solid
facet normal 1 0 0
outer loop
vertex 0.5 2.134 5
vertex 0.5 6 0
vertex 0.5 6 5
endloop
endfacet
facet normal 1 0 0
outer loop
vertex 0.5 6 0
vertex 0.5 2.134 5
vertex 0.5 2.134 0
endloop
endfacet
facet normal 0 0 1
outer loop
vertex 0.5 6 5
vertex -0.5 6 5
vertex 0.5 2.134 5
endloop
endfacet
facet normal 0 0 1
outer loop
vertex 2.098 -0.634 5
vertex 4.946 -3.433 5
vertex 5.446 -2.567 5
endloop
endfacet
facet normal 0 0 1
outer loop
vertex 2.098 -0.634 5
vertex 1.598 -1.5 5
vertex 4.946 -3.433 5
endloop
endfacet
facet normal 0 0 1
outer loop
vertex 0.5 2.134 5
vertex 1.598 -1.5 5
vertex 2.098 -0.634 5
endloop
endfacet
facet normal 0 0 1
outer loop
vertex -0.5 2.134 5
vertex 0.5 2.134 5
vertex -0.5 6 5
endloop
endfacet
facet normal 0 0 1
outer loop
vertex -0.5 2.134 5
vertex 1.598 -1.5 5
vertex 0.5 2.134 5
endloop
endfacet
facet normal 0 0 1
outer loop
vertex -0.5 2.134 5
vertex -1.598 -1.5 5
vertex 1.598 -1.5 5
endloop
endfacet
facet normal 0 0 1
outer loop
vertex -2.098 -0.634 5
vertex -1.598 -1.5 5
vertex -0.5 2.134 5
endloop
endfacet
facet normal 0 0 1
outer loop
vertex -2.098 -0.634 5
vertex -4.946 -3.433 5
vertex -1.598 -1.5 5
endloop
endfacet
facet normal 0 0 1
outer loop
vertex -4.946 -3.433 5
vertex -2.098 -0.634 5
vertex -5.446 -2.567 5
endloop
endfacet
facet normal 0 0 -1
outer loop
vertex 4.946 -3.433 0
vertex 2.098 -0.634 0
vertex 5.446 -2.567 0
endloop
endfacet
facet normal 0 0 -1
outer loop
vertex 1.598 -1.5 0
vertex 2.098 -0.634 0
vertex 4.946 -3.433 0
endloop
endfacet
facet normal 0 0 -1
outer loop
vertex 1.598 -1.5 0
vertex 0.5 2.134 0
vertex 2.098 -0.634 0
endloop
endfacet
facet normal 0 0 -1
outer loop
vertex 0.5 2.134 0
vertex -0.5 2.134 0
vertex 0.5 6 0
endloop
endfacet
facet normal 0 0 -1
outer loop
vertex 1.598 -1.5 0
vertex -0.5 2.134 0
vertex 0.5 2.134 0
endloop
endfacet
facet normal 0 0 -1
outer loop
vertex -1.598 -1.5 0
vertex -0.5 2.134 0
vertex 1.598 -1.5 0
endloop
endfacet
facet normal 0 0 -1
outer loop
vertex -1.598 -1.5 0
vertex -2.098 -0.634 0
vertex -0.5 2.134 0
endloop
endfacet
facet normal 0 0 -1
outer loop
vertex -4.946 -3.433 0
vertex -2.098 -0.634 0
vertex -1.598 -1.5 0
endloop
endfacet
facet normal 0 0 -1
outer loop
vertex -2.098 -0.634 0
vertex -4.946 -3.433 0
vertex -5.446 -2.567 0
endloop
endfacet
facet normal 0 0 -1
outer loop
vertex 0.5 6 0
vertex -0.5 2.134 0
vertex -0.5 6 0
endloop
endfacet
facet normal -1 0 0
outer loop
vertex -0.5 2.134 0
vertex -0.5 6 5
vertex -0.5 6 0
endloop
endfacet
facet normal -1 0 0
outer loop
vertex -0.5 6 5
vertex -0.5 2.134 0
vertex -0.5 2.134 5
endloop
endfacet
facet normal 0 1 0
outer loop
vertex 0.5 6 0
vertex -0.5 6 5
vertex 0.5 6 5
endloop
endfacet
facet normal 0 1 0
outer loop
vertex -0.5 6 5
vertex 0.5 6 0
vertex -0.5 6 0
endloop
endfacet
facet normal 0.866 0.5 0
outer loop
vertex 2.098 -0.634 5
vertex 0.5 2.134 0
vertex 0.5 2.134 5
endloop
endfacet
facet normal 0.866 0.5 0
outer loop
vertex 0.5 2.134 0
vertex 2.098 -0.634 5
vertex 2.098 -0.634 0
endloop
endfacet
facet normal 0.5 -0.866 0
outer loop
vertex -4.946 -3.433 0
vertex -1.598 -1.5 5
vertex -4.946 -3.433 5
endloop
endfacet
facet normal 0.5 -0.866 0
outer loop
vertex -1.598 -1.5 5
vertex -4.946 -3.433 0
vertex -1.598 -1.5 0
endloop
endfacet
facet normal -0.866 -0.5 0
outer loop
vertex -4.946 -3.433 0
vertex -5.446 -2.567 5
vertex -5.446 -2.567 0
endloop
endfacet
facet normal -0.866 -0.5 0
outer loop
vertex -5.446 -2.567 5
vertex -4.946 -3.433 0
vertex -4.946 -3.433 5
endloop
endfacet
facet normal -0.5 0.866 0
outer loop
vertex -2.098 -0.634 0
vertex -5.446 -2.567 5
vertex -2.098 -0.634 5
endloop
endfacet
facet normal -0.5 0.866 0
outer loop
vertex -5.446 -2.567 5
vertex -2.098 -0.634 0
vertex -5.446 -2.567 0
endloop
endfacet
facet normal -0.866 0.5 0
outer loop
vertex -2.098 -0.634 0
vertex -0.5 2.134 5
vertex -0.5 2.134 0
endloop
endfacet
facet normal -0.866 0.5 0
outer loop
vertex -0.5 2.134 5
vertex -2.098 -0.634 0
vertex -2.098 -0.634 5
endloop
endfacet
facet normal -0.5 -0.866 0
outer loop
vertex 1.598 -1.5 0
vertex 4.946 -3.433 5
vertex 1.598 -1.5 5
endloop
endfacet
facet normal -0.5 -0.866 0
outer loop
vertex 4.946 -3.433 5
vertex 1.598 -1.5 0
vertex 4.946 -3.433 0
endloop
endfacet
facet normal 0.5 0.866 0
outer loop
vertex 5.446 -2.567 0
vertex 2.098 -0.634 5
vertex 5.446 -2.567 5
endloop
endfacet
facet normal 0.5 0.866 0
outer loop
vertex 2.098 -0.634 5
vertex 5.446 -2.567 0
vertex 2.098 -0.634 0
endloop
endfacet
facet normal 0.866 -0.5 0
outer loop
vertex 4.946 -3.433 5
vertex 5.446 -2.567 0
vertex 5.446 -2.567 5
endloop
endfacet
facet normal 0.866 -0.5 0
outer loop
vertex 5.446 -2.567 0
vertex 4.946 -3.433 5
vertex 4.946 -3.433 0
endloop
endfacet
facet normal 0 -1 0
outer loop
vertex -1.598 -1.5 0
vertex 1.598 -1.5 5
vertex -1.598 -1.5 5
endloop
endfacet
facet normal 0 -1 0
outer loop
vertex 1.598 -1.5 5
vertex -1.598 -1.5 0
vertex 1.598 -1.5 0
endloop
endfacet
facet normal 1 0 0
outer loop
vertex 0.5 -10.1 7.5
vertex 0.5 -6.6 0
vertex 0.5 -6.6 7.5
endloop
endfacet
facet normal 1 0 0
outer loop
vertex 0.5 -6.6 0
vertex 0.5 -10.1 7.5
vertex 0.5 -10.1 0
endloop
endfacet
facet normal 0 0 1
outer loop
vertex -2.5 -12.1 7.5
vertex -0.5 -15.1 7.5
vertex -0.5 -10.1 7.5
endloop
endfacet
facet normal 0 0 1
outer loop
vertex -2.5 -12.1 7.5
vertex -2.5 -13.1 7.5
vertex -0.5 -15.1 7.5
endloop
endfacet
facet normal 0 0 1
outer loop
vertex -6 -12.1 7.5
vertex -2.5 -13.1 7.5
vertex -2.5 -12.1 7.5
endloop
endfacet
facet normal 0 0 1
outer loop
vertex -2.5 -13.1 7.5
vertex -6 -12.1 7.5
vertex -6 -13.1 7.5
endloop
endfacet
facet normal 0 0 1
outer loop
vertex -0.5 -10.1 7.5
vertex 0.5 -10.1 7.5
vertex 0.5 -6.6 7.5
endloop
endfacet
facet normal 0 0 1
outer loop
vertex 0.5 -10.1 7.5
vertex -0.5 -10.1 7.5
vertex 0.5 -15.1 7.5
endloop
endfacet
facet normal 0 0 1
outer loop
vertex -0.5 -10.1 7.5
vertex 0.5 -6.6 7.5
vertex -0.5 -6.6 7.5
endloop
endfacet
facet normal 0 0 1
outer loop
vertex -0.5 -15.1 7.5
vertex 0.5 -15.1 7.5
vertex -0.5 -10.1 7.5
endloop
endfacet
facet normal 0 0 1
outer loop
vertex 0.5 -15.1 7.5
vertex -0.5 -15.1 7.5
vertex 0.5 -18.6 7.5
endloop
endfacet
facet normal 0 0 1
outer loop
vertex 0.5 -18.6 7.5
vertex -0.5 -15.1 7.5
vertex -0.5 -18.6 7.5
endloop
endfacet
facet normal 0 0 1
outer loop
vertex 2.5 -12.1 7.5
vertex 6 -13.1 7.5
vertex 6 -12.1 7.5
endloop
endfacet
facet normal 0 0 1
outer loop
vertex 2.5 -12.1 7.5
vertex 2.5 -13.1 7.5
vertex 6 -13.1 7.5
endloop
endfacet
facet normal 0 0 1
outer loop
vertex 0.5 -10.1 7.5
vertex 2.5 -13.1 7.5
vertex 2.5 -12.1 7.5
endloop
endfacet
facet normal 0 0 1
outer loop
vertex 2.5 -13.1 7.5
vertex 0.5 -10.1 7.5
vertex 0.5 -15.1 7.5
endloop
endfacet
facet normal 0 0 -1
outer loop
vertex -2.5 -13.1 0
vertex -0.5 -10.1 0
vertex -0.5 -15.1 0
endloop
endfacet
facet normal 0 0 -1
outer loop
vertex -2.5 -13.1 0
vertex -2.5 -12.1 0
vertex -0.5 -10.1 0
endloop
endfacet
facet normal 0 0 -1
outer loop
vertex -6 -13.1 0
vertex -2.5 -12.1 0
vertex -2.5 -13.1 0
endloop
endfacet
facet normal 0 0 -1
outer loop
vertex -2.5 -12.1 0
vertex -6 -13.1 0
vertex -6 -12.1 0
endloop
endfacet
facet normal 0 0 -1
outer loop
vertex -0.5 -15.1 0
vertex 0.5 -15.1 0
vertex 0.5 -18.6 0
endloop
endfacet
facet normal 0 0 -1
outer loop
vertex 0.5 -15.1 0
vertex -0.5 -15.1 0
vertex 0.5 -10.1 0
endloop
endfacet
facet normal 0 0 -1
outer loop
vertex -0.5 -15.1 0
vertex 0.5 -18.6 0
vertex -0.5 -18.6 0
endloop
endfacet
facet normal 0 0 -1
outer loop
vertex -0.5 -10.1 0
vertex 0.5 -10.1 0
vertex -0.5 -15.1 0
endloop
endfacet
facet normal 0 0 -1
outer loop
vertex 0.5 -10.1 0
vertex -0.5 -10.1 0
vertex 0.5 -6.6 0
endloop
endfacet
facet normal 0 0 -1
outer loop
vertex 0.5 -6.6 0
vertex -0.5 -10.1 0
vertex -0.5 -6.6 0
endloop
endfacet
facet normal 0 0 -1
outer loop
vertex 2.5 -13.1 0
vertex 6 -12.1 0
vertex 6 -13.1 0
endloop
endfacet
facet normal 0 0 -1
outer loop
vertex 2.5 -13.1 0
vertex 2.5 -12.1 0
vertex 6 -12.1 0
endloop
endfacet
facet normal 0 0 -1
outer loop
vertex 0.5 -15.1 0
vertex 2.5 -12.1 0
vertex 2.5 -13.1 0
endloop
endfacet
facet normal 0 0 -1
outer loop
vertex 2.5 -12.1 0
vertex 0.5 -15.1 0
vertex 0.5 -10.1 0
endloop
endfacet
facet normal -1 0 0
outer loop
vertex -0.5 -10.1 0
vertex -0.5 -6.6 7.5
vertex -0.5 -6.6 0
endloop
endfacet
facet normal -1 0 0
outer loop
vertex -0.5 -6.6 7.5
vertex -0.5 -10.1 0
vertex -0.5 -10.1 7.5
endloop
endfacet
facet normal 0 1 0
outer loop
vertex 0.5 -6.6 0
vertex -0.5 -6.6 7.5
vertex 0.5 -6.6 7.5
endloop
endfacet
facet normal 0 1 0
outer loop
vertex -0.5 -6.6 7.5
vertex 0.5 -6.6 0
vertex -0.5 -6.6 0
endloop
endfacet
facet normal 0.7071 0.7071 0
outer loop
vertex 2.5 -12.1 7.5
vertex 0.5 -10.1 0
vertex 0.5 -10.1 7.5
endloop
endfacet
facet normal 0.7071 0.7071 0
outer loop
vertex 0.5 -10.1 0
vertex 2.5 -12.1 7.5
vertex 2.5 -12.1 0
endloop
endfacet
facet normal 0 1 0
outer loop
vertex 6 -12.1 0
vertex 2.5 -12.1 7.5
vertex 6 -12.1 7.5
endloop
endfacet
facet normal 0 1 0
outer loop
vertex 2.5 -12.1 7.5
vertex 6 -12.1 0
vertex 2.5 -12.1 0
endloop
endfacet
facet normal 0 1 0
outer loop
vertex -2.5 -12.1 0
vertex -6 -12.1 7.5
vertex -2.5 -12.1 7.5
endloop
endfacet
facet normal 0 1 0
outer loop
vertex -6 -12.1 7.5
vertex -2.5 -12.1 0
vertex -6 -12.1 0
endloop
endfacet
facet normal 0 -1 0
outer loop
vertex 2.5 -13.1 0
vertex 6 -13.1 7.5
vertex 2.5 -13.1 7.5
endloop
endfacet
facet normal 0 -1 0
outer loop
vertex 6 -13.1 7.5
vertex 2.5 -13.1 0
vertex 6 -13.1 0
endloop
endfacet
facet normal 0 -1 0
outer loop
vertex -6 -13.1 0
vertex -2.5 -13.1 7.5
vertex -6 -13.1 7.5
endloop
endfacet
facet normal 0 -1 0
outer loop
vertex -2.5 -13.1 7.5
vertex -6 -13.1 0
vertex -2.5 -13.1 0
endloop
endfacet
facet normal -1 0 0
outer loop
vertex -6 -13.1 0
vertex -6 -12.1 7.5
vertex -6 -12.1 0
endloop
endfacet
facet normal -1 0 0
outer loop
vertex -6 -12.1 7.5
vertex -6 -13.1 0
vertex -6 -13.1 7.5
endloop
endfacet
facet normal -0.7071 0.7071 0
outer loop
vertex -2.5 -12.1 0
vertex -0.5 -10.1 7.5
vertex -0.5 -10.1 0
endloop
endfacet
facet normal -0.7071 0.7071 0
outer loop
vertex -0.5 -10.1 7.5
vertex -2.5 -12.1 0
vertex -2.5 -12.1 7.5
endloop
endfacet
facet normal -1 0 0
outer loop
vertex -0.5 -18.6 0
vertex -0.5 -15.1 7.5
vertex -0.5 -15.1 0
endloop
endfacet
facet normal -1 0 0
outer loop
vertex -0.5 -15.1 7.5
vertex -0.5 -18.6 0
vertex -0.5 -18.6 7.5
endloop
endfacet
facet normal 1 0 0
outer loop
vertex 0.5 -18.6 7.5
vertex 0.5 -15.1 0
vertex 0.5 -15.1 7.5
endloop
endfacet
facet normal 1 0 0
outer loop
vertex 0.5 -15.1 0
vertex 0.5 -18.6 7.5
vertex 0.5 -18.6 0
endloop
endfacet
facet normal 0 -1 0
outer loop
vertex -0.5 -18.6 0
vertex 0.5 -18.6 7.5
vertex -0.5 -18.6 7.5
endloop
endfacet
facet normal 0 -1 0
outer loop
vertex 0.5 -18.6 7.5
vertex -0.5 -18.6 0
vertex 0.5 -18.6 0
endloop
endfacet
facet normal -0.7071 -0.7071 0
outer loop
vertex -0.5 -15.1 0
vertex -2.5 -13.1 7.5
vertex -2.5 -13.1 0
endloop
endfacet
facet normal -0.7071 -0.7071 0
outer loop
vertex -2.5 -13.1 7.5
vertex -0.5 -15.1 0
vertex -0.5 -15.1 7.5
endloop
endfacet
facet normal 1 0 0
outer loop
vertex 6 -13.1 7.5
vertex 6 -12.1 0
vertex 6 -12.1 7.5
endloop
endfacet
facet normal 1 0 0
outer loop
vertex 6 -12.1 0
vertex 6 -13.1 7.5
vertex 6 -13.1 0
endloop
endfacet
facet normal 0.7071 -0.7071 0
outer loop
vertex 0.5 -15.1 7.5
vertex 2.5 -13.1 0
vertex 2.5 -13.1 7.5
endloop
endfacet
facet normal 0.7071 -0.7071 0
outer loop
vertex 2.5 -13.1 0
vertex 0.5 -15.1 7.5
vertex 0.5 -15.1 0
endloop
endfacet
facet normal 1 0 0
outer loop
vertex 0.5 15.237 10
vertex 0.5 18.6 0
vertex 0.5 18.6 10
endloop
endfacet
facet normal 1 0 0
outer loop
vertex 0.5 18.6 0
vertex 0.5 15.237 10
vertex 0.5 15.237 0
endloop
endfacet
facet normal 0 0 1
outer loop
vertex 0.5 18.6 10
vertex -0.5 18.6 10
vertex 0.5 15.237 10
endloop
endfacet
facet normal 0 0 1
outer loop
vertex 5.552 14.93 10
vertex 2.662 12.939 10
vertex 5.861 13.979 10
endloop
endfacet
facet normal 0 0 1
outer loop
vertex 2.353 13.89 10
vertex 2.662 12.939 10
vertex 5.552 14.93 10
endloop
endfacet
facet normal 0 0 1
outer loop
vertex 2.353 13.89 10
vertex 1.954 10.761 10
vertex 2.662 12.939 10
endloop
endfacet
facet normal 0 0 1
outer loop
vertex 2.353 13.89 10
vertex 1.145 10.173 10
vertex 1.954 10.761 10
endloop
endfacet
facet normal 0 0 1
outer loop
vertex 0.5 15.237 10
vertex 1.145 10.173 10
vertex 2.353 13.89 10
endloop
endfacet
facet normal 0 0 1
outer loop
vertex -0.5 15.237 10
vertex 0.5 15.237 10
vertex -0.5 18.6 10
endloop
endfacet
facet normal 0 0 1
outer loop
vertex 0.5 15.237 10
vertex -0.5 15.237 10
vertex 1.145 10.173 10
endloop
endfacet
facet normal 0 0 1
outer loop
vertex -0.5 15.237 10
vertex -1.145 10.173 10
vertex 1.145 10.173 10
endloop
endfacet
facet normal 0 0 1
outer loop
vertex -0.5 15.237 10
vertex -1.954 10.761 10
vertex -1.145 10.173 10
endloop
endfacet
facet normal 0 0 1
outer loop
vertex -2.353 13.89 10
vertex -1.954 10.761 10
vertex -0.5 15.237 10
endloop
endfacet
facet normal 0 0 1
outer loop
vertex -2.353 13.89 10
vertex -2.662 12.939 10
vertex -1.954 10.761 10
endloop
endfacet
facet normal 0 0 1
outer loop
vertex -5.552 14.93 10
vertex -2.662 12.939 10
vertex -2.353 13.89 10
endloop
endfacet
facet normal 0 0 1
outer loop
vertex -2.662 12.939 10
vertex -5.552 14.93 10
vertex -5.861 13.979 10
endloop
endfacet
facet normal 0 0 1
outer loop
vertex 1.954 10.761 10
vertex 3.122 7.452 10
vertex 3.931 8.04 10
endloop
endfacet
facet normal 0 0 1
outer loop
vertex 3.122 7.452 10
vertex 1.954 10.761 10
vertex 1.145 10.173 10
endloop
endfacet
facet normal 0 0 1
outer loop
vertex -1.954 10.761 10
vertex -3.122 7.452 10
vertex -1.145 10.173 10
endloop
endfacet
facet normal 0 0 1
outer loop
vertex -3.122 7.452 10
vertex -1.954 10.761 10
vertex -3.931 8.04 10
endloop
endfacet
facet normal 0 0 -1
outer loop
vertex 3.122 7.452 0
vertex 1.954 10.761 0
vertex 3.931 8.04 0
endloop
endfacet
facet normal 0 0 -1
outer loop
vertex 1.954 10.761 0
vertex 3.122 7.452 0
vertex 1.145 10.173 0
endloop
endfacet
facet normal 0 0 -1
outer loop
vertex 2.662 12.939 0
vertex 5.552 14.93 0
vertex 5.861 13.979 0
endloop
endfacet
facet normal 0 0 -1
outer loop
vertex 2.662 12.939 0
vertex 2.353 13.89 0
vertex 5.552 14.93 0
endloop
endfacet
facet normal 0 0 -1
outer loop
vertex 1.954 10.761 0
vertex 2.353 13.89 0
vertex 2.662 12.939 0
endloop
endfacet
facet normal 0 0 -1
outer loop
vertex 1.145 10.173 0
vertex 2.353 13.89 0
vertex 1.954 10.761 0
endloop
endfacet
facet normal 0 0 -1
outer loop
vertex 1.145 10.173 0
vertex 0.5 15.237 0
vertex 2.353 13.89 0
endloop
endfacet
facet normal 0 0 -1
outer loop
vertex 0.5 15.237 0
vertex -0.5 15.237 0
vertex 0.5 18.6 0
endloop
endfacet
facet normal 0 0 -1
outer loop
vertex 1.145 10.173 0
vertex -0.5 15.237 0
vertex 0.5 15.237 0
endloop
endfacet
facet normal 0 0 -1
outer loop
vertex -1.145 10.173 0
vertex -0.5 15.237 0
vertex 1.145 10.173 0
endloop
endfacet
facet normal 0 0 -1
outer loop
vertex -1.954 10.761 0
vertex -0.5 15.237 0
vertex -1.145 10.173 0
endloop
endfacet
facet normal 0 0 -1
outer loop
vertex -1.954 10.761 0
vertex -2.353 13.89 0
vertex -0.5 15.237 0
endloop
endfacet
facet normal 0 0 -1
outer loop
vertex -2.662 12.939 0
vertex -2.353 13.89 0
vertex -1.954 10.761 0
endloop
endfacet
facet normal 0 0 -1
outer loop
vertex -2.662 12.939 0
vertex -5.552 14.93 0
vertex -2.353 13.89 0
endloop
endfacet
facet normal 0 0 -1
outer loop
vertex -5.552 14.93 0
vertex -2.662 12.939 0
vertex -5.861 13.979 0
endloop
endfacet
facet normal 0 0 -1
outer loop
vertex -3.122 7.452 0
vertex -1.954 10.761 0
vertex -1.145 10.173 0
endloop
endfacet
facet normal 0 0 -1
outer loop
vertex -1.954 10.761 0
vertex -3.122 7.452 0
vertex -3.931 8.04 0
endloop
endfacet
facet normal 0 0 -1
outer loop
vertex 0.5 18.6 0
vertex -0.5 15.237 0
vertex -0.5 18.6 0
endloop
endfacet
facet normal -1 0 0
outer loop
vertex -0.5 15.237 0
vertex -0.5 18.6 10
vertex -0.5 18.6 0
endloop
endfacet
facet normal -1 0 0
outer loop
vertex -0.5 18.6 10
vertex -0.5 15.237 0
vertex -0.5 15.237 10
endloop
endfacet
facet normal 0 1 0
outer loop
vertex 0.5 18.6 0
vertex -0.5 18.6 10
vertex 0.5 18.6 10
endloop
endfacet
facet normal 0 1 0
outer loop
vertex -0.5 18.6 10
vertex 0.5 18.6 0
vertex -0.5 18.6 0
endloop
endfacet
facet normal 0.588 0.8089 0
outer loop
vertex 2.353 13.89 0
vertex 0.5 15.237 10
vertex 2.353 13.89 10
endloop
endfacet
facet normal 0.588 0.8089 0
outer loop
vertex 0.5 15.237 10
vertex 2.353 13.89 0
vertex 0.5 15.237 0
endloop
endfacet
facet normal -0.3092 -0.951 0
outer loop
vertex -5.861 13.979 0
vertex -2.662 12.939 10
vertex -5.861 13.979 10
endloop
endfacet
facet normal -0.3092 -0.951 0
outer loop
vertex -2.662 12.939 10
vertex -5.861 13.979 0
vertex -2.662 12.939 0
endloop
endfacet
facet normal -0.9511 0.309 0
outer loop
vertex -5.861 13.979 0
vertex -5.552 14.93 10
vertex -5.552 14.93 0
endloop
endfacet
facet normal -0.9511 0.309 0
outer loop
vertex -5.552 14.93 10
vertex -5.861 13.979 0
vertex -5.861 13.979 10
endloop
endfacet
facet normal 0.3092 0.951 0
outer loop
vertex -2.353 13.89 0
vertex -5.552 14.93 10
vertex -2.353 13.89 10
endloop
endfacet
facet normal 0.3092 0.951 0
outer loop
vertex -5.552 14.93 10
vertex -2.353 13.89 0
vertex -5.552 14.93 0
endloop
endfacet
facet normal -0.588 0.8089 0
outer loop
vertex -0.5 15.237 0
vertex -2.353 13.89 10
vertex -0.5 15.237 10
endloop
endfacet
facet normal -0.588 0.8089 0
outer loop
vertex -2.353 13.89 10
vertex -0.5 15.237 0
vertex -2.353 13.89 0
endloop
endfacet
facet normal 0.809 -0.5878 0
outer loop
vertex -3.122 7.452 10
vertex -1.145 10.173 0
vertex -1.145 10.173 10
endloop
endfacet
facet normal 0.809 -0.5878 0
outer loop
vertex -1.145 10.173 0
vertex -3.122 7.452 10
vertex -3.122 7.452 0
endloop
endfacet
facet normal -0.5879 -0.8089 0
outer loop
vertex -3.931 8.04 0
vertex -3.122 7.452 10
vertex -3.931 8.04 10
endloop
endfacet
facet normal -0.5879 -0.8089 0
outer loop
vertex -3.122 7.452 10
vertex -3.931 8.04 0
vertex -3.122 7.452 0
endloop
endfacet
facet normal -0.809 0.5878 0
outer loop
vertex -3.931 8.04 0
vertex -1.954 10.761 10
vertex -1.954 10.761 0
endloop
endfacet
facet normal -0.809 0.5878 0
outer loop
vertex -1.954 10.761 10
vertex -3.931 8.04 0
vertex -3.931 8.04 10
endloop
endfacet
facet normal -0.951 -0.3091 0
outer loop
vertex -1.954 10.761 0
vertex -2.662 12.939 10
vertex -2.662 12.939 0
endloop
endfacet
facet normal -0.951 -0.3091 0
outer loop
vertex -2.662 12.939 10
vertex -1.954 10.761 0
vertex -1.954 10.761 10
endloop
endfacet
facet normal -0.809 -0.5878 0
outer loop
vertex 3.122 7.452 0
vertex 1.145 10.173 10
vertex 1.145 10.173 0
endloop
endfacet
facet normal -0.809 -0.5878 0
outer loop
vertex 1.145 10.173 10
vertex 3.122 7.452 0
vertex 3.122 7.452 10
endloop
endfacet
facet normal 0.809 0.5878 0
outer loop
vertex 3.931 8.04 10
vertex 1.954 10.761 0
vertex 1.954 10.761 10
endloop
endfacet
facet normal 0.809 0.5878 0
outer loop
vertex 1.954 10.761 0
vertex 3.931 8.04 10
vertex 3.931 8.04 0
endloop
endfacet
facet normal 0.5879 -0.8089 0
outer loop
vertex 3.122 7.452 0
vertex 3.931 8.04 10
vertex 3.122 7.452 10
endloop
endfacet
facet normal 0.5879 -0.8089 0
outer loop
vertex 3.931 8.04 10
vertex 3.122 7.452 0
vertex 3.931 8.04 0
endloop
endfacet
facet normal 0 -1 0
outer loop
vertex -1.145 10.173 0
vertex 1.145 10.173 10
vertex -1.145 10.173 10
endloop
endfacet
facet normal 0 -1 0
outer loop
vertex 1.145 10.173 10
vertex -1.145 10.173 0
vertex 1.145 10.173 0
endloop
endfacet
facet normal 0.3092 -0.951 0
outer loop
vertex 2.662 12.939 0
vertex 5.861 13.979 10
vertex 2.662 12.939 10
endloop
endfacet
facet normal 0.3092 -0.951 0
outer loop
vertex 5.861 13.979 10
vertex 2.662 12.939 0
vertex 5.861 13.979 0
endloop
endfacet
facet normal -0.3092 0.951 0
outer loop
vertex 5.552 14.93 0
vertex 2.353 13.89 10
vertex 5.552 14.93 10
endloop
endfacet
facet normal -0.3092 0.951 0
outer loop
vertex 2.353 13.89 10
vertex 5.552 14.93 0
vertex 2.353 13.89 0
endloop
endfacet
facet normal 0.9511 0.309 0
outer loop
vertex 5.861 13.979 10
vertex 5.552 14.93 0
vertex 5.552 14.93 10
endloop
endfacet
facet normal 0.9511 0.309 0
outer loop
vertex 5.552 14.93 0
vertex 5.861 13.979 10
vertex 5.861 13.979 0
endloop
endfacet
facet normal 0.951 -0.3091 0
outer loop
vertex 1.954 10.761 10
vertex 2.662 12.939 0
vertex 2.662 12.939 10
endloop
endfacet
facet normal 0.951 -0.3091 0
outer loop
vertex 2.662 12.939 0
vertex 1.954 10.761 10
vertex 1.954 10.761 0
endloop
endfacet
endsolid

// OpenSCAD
w=1;
d=6;
s=d*2.1;
r=w*3;

h1=5;
h2=h1*1.5;
h3=h1*2;

module risk(points, h) {
	angle = 360/points;
	angle2 = angle/2;
	middle = w*(points/2);
	middle2 = middle/2;
	filler = d/2;
	x = sin(angle) * filler;
	y = cos(angle) * filler;
	for (i = [0:points - 1]) {
		rotate([0,0, angle*i])
		translate([-w/2,0,0])
		cube([w,d,h]);
		rotate([0,0,angle*i])
		polyhedron( [ [0,0,0], [0,filler,0],[x,y,0], [0,0,h], [0,filler,h],[x,y,h]],
				   [ [2,1,0], [3,4,5], [0,1,4], [0,4,3], [0,3,2], [2,3,5], [1,2,5],[1,5,4] ]);
	}
}


risk(3, h1);

translate([0,-s,0])
risk(4,h2);

translate([0,s,0])
risk(5,h3);
